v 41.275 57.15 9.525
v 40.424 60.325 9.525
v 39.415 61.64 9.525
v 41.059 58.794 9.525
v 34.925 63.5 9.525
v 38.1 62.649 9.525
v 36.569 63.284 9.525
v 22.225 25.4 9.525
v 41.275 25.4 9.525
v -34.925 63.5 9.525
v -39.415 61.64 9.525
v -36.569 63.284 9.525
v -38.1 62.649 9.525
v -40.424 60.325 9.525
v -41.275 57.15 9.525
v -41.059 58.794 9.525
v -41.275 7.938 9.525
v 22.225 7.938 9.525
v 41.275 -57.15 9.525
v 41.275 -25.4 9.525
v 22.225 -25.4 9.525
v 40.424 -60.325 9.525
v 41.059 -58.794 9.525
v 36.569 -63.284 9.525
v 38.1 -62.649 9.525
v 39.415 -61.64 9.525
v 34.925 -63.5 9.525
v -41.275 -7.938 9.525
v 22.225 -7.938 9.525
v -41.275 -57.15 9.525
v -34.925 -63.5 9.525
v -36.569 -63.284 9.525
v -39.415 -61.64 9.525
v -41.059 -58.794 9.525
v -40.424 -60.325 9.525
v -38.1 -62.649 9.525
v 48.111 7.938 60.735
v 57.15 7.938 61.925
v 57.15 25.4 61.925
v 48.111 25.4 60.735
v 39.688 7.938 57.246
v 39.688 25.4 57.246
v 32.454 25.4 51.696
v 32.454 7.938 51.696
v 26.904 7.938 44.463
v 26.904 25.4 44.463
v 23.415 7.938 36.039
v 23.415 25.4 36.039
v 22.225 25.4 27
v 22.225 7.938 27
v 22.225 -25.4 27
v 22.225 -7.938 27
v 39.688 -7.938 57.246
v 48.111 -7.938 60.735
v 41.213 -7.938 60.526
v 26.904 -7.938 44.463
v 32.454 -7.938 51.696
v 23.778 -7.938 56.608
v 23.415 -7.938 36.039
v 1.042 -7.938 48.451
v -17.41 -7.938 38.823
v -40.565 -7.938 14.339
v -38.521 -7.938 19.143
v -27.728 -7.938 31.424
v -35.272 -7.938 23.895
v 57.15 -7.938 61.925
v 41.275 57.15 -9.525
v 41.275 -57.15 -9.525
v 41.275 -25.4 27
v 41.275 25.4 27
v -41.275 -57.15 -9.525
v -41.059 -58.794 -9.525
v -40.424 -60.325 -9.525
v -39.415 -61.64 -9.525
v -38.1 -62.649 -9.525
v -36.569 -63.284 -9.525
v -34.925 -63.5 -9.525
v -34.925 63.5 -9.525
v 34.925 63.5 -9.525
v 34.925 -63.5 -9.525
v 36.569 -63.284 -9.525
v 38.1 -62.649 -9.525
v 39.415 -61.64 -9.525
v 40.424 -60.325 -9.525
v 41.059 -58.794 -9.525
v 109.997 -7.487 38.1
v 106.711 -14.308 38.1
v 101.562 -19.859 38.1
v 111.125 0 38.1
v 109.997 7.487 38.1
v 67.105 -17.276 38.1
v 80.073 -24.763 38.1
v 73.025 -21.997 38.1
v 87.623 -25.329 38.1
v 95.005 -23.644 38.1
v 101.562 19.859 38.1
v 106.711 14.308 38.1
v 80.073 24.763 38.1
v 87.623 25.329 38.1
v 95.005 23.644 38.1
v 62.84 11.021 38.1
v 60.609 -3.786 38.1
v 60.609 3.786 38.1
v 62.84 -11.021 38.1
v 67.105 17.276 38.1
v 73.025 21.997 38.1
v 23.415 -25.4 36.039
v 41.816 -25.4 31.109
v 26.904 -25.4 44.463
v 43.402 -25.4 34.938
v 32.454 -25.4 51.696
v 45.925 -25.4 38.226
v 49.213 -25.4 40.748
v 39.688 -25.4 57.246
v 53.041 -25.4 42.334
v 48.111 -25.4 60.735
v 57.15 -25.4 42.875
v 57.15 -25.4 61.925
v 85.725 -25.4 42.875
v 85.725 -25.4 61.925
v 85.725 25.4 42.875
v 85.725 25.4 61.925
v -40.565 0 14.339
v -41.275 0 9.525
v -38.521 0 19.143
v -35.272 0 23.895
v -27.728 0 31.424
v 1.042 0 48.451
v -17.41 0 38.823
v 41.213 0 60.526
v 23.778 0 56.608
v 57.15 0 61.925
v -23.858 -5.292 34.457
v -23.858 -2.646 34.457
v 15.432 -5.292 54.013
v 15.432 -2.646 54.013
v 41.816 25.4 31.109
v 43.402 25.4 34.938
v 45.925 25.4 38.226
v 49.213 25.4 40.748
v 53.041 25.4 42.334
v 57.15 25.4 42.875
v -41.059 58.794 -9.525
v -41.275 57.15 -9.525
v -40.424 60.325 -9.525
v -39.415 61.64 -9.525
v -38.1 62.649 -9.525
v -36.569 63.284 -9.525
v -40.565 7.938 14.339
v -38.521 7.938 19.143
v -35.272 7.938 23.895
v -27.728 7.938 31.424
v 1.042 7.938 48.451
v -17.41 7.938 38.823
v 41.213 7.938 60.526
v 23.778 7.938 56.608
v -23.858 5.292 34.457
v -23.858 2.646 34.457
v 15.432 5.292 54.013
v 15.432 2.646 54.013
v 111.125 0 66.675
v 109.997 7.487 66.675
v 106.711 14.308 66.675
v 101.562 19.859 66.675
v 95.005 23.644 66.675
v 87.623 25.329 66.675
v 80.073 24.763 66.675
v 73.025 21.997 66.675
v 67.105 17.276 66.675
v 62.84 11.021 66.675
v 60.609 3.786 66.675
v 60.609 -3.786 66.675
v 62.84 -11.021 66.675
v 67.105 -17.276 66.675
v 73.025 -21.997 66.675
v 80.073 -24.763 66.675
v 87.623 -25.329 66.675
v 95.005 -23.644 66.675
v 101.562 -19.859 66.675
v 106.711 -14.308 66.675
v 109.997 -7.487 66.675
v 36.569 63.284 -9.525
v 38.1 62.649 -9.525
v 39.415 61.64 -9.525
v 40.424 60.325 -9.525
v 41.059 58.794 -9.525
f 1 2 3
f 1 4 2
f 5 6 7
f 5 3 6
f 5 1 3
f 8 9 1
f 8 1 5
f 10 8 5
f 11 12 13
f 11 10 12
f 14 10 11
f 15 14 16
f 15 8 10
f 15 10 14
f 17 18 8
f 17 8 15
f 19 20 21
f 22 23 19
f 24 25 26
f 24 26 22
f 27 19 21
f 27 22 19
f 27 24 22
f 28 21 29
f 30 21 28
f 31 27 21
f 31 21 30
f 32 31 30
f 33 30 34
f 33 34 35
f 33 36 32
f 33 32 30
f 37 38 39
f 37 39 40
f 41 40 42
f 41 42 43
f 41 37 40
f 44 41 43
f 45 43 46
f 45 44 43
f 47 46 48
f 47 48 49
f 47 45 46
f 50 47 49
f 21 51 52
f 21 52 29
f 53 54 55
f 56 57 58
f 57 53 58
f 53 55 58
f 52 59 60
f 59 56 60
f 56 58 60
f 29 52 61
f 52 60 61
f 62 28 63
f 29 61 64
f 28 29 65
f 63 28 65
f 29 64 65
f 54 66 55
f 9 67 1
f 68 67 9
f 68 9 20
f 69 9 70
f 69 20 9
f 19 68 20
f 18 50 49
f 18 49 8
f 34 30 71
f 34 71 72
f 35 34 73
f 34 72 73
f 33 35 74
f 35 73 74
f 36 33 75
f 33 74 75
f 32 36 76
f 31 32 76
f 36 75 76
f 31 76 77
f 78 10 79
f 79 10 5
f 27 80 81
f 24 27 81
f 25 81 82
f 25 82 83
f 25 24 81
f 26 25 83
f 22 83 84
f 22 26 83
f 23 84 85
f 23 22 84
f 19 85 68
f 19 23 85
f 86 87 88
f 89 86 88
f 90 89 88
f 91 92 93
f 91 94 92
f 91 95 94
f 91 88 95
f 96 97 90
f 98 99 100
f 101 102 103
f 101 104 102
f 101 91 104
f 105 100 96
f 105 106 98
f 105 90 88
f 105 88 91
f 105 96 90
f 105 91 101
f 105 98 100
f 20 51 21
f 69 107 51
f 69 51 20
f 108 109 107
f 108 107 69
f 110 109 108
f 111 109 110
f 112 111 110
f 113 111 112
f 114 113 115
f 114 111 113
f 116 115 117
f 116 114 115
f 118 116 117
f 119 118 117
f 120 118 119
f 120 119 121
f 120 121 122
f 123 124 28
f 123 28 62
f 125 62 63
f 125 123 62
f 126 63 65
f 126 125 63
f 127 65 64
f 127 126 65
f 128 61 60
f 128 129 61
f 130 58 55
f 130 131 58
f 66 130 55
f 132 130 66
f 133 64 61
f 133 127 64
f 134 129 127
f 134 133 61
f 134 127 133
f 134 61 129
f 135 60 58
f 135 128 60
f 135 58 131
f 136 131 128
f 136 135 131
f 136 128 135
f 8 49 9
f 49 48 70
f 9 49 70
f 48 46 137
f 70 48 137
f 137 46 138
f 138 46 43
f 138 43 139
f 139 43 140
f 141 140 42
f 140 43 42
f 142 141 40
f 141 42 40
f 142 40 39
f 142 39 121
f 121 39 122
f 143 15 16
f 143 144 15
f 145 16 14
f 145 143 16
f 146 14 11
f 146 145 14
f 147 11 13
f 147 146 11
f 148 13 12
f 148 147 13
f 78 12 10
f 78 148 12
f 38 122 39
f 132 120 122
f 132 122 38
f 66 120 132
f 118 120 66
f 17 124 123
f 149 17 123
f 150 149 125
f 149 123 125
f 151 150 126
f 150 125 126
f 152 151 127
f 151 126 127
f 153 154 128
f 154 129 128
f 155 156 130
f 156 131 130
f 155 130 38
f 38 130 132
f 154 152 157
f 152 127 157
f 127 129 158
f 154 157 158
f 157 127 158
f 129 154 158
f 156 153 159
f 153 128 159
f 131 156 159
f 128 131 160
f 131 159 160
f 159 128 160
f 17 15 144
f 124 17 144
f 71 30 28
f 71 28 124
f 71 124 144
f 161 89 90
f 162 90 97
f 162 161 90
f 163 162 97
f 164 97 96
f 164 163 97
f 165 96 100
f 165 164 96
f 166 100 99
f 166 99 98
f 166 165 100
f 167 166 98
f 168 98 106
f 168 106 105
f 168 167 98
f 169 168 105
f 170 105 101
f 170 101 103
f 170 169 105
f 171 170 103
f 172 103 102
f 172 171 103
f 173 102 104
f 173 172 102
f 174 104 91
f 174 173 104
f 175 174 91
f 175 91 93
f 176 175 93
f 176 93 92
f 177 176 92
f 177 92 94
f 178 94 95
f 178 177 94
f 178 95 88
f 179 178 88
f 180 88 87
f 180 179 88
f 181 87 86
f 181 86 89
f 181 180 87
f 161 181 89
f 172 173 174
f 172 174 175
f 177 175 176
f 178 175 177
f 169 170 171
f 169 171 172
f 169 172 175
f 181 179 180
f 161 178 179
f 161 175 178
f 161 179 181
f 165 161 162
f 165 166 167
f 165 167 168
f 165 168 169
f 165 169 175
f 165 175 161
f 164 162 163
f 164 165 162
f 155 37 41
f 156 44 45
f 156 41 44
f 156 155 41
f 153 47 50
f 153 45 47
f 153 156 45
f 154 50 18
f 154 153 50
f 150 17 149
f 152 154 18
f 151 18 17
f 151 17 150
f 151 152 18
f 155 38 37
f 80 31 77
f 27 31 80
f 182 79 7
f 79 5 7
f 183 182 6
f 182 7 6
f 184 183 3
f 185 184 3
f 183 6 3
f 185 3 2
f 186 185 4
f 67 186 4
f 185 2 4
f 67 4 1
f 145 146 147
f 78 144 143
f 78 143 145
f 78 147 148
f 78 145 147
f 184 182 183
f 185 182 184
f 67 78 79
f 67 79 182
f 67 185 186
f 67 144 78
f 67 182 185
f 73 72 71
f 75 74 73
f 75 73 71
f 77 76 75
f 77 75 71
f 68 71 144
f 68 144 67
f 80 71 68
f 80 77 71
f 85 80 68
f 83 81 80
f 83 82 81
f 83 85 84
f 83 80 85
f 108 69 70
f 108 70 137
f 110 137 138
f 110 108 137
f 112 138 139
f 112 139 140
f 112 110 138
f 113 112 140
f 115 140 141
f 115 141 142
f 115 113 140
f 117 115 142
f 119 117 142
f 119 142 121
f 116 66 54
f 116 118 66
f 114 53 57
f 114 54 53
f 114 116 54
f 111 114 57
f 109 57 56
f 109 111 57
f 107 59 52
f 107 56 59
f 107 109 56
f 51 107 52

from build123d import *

# Parameters (mm, degrees)
F1_DEPTH = 63.5
F0_W     = 25.4
F0_H     = 19.05
F2_DEPTH = 25.4
F3_DEPTH = 7.9375
F7_R     = 6.35


with BuildPart() as f1:
    # F0 (on Front) → F1 (new body, symmetric)
    with BuildSketch(Plane.XZ):
        Polygon((22.225, 9.525), (-41.275, 9.525), (-41.275, -9.525), (41.275, -9.525), (41.275, 9.525), align=None)
    extrude(amount=F1_DEPTH, both=True)

    # F0 (on Front) → F2 (join, symmetric)
    with BuildSketch(Plane.XZ):
        with BuildLine():
            Line((22.225, 27.0002), (22.225, 9.525))
            Line((22.225, 9.525), (41.275, 9.525))
            Line((41.275, 9.525), (41.275, 27.0002))
            ThreePointArc((41.275, 27.0002), (45.9246798487, 38.2255201513), (57.15, 42.8752))
            Line((57.15, 42.8752), (60.325, 42.8752))
            Line((60.325, 42.8752), (60.325, 61.9252))
            Line((60.325, 61.9252), (57.15, 61.9252))
            ThreePointArc((57.15, 61.9252), (32.4542956671, 51.6959043329), (22.225, 27.0002))
        make_face()
        with Locations((73.025, 52.4002)):
            Rectangle(F0_W, F0_H)
    extrude(amount=F2_DEPTH, both=True)

    # F0 (on Front) → F3 (join, symmetric)
    with BuildSketch(Plane.XZ):
        with BuildLine():
            add(Edge.make_bspline(
                [(-41.275, 9.525), (-41.275, 35.0551274456), (20.699101642, 61.9252), (57.15, 61.9252)],
                knots=[0, 0, 0, 0, 111.5045361635, 111.5045361635, 111.5045361635, 111.5045361635], degree=3))
            Line((-41.275, 9.525), (22.225, 9.525))
            Line((22.225, 9.525), (22.225, 27.0002))
            ThreePointArc((22.225, 27.0002), (32.4542956671, 51.6959043329), (57.15, 61.9252))
        make_face()
    extrude(amount=F3_DEPTH, both=True)

    # F7
    f7_edges = [f1.edges().sort_by_distance(p)[0] for p in [
        (41.275, -63.5, 0),
        (-41.275, -63.5, 0),
        (-41.275, 63.5, 0),
        (41.275, 63.5, 0),
    ]]
    fillet(f7_edges, radius=F7_R)


with BuildPart() as f4:
    # F0 (on Front) → F4 (revolve)
    with BuildSketch(Plane.XZ):
        Polygon((85.725, 66.675), (85.725, 61.9252), (85.725, 42.8752), (85.725, 38.1), (111.125, 38.1), (111.125, 66.675), align=None)
    revolve(axis=Axis((85.725, 0, 52.3875), (0, 0, 1)))


with BuildPart() as f6:
    # F0 (on Front) → F6 (revolve)
    with BuildSketch(Plane.XZ):
        Polygon((85.725, 66.675), (85.725, 61.9252), (85.725, 42.8752), (85.725, 38.1), (111.125, 38.1), (111.125, 66.675), align=None)
    revolve(axis=Axis((85.725, 0, 52.3875), (0, 0, 1)))


solid = Compound([f1.part, f6.part])
